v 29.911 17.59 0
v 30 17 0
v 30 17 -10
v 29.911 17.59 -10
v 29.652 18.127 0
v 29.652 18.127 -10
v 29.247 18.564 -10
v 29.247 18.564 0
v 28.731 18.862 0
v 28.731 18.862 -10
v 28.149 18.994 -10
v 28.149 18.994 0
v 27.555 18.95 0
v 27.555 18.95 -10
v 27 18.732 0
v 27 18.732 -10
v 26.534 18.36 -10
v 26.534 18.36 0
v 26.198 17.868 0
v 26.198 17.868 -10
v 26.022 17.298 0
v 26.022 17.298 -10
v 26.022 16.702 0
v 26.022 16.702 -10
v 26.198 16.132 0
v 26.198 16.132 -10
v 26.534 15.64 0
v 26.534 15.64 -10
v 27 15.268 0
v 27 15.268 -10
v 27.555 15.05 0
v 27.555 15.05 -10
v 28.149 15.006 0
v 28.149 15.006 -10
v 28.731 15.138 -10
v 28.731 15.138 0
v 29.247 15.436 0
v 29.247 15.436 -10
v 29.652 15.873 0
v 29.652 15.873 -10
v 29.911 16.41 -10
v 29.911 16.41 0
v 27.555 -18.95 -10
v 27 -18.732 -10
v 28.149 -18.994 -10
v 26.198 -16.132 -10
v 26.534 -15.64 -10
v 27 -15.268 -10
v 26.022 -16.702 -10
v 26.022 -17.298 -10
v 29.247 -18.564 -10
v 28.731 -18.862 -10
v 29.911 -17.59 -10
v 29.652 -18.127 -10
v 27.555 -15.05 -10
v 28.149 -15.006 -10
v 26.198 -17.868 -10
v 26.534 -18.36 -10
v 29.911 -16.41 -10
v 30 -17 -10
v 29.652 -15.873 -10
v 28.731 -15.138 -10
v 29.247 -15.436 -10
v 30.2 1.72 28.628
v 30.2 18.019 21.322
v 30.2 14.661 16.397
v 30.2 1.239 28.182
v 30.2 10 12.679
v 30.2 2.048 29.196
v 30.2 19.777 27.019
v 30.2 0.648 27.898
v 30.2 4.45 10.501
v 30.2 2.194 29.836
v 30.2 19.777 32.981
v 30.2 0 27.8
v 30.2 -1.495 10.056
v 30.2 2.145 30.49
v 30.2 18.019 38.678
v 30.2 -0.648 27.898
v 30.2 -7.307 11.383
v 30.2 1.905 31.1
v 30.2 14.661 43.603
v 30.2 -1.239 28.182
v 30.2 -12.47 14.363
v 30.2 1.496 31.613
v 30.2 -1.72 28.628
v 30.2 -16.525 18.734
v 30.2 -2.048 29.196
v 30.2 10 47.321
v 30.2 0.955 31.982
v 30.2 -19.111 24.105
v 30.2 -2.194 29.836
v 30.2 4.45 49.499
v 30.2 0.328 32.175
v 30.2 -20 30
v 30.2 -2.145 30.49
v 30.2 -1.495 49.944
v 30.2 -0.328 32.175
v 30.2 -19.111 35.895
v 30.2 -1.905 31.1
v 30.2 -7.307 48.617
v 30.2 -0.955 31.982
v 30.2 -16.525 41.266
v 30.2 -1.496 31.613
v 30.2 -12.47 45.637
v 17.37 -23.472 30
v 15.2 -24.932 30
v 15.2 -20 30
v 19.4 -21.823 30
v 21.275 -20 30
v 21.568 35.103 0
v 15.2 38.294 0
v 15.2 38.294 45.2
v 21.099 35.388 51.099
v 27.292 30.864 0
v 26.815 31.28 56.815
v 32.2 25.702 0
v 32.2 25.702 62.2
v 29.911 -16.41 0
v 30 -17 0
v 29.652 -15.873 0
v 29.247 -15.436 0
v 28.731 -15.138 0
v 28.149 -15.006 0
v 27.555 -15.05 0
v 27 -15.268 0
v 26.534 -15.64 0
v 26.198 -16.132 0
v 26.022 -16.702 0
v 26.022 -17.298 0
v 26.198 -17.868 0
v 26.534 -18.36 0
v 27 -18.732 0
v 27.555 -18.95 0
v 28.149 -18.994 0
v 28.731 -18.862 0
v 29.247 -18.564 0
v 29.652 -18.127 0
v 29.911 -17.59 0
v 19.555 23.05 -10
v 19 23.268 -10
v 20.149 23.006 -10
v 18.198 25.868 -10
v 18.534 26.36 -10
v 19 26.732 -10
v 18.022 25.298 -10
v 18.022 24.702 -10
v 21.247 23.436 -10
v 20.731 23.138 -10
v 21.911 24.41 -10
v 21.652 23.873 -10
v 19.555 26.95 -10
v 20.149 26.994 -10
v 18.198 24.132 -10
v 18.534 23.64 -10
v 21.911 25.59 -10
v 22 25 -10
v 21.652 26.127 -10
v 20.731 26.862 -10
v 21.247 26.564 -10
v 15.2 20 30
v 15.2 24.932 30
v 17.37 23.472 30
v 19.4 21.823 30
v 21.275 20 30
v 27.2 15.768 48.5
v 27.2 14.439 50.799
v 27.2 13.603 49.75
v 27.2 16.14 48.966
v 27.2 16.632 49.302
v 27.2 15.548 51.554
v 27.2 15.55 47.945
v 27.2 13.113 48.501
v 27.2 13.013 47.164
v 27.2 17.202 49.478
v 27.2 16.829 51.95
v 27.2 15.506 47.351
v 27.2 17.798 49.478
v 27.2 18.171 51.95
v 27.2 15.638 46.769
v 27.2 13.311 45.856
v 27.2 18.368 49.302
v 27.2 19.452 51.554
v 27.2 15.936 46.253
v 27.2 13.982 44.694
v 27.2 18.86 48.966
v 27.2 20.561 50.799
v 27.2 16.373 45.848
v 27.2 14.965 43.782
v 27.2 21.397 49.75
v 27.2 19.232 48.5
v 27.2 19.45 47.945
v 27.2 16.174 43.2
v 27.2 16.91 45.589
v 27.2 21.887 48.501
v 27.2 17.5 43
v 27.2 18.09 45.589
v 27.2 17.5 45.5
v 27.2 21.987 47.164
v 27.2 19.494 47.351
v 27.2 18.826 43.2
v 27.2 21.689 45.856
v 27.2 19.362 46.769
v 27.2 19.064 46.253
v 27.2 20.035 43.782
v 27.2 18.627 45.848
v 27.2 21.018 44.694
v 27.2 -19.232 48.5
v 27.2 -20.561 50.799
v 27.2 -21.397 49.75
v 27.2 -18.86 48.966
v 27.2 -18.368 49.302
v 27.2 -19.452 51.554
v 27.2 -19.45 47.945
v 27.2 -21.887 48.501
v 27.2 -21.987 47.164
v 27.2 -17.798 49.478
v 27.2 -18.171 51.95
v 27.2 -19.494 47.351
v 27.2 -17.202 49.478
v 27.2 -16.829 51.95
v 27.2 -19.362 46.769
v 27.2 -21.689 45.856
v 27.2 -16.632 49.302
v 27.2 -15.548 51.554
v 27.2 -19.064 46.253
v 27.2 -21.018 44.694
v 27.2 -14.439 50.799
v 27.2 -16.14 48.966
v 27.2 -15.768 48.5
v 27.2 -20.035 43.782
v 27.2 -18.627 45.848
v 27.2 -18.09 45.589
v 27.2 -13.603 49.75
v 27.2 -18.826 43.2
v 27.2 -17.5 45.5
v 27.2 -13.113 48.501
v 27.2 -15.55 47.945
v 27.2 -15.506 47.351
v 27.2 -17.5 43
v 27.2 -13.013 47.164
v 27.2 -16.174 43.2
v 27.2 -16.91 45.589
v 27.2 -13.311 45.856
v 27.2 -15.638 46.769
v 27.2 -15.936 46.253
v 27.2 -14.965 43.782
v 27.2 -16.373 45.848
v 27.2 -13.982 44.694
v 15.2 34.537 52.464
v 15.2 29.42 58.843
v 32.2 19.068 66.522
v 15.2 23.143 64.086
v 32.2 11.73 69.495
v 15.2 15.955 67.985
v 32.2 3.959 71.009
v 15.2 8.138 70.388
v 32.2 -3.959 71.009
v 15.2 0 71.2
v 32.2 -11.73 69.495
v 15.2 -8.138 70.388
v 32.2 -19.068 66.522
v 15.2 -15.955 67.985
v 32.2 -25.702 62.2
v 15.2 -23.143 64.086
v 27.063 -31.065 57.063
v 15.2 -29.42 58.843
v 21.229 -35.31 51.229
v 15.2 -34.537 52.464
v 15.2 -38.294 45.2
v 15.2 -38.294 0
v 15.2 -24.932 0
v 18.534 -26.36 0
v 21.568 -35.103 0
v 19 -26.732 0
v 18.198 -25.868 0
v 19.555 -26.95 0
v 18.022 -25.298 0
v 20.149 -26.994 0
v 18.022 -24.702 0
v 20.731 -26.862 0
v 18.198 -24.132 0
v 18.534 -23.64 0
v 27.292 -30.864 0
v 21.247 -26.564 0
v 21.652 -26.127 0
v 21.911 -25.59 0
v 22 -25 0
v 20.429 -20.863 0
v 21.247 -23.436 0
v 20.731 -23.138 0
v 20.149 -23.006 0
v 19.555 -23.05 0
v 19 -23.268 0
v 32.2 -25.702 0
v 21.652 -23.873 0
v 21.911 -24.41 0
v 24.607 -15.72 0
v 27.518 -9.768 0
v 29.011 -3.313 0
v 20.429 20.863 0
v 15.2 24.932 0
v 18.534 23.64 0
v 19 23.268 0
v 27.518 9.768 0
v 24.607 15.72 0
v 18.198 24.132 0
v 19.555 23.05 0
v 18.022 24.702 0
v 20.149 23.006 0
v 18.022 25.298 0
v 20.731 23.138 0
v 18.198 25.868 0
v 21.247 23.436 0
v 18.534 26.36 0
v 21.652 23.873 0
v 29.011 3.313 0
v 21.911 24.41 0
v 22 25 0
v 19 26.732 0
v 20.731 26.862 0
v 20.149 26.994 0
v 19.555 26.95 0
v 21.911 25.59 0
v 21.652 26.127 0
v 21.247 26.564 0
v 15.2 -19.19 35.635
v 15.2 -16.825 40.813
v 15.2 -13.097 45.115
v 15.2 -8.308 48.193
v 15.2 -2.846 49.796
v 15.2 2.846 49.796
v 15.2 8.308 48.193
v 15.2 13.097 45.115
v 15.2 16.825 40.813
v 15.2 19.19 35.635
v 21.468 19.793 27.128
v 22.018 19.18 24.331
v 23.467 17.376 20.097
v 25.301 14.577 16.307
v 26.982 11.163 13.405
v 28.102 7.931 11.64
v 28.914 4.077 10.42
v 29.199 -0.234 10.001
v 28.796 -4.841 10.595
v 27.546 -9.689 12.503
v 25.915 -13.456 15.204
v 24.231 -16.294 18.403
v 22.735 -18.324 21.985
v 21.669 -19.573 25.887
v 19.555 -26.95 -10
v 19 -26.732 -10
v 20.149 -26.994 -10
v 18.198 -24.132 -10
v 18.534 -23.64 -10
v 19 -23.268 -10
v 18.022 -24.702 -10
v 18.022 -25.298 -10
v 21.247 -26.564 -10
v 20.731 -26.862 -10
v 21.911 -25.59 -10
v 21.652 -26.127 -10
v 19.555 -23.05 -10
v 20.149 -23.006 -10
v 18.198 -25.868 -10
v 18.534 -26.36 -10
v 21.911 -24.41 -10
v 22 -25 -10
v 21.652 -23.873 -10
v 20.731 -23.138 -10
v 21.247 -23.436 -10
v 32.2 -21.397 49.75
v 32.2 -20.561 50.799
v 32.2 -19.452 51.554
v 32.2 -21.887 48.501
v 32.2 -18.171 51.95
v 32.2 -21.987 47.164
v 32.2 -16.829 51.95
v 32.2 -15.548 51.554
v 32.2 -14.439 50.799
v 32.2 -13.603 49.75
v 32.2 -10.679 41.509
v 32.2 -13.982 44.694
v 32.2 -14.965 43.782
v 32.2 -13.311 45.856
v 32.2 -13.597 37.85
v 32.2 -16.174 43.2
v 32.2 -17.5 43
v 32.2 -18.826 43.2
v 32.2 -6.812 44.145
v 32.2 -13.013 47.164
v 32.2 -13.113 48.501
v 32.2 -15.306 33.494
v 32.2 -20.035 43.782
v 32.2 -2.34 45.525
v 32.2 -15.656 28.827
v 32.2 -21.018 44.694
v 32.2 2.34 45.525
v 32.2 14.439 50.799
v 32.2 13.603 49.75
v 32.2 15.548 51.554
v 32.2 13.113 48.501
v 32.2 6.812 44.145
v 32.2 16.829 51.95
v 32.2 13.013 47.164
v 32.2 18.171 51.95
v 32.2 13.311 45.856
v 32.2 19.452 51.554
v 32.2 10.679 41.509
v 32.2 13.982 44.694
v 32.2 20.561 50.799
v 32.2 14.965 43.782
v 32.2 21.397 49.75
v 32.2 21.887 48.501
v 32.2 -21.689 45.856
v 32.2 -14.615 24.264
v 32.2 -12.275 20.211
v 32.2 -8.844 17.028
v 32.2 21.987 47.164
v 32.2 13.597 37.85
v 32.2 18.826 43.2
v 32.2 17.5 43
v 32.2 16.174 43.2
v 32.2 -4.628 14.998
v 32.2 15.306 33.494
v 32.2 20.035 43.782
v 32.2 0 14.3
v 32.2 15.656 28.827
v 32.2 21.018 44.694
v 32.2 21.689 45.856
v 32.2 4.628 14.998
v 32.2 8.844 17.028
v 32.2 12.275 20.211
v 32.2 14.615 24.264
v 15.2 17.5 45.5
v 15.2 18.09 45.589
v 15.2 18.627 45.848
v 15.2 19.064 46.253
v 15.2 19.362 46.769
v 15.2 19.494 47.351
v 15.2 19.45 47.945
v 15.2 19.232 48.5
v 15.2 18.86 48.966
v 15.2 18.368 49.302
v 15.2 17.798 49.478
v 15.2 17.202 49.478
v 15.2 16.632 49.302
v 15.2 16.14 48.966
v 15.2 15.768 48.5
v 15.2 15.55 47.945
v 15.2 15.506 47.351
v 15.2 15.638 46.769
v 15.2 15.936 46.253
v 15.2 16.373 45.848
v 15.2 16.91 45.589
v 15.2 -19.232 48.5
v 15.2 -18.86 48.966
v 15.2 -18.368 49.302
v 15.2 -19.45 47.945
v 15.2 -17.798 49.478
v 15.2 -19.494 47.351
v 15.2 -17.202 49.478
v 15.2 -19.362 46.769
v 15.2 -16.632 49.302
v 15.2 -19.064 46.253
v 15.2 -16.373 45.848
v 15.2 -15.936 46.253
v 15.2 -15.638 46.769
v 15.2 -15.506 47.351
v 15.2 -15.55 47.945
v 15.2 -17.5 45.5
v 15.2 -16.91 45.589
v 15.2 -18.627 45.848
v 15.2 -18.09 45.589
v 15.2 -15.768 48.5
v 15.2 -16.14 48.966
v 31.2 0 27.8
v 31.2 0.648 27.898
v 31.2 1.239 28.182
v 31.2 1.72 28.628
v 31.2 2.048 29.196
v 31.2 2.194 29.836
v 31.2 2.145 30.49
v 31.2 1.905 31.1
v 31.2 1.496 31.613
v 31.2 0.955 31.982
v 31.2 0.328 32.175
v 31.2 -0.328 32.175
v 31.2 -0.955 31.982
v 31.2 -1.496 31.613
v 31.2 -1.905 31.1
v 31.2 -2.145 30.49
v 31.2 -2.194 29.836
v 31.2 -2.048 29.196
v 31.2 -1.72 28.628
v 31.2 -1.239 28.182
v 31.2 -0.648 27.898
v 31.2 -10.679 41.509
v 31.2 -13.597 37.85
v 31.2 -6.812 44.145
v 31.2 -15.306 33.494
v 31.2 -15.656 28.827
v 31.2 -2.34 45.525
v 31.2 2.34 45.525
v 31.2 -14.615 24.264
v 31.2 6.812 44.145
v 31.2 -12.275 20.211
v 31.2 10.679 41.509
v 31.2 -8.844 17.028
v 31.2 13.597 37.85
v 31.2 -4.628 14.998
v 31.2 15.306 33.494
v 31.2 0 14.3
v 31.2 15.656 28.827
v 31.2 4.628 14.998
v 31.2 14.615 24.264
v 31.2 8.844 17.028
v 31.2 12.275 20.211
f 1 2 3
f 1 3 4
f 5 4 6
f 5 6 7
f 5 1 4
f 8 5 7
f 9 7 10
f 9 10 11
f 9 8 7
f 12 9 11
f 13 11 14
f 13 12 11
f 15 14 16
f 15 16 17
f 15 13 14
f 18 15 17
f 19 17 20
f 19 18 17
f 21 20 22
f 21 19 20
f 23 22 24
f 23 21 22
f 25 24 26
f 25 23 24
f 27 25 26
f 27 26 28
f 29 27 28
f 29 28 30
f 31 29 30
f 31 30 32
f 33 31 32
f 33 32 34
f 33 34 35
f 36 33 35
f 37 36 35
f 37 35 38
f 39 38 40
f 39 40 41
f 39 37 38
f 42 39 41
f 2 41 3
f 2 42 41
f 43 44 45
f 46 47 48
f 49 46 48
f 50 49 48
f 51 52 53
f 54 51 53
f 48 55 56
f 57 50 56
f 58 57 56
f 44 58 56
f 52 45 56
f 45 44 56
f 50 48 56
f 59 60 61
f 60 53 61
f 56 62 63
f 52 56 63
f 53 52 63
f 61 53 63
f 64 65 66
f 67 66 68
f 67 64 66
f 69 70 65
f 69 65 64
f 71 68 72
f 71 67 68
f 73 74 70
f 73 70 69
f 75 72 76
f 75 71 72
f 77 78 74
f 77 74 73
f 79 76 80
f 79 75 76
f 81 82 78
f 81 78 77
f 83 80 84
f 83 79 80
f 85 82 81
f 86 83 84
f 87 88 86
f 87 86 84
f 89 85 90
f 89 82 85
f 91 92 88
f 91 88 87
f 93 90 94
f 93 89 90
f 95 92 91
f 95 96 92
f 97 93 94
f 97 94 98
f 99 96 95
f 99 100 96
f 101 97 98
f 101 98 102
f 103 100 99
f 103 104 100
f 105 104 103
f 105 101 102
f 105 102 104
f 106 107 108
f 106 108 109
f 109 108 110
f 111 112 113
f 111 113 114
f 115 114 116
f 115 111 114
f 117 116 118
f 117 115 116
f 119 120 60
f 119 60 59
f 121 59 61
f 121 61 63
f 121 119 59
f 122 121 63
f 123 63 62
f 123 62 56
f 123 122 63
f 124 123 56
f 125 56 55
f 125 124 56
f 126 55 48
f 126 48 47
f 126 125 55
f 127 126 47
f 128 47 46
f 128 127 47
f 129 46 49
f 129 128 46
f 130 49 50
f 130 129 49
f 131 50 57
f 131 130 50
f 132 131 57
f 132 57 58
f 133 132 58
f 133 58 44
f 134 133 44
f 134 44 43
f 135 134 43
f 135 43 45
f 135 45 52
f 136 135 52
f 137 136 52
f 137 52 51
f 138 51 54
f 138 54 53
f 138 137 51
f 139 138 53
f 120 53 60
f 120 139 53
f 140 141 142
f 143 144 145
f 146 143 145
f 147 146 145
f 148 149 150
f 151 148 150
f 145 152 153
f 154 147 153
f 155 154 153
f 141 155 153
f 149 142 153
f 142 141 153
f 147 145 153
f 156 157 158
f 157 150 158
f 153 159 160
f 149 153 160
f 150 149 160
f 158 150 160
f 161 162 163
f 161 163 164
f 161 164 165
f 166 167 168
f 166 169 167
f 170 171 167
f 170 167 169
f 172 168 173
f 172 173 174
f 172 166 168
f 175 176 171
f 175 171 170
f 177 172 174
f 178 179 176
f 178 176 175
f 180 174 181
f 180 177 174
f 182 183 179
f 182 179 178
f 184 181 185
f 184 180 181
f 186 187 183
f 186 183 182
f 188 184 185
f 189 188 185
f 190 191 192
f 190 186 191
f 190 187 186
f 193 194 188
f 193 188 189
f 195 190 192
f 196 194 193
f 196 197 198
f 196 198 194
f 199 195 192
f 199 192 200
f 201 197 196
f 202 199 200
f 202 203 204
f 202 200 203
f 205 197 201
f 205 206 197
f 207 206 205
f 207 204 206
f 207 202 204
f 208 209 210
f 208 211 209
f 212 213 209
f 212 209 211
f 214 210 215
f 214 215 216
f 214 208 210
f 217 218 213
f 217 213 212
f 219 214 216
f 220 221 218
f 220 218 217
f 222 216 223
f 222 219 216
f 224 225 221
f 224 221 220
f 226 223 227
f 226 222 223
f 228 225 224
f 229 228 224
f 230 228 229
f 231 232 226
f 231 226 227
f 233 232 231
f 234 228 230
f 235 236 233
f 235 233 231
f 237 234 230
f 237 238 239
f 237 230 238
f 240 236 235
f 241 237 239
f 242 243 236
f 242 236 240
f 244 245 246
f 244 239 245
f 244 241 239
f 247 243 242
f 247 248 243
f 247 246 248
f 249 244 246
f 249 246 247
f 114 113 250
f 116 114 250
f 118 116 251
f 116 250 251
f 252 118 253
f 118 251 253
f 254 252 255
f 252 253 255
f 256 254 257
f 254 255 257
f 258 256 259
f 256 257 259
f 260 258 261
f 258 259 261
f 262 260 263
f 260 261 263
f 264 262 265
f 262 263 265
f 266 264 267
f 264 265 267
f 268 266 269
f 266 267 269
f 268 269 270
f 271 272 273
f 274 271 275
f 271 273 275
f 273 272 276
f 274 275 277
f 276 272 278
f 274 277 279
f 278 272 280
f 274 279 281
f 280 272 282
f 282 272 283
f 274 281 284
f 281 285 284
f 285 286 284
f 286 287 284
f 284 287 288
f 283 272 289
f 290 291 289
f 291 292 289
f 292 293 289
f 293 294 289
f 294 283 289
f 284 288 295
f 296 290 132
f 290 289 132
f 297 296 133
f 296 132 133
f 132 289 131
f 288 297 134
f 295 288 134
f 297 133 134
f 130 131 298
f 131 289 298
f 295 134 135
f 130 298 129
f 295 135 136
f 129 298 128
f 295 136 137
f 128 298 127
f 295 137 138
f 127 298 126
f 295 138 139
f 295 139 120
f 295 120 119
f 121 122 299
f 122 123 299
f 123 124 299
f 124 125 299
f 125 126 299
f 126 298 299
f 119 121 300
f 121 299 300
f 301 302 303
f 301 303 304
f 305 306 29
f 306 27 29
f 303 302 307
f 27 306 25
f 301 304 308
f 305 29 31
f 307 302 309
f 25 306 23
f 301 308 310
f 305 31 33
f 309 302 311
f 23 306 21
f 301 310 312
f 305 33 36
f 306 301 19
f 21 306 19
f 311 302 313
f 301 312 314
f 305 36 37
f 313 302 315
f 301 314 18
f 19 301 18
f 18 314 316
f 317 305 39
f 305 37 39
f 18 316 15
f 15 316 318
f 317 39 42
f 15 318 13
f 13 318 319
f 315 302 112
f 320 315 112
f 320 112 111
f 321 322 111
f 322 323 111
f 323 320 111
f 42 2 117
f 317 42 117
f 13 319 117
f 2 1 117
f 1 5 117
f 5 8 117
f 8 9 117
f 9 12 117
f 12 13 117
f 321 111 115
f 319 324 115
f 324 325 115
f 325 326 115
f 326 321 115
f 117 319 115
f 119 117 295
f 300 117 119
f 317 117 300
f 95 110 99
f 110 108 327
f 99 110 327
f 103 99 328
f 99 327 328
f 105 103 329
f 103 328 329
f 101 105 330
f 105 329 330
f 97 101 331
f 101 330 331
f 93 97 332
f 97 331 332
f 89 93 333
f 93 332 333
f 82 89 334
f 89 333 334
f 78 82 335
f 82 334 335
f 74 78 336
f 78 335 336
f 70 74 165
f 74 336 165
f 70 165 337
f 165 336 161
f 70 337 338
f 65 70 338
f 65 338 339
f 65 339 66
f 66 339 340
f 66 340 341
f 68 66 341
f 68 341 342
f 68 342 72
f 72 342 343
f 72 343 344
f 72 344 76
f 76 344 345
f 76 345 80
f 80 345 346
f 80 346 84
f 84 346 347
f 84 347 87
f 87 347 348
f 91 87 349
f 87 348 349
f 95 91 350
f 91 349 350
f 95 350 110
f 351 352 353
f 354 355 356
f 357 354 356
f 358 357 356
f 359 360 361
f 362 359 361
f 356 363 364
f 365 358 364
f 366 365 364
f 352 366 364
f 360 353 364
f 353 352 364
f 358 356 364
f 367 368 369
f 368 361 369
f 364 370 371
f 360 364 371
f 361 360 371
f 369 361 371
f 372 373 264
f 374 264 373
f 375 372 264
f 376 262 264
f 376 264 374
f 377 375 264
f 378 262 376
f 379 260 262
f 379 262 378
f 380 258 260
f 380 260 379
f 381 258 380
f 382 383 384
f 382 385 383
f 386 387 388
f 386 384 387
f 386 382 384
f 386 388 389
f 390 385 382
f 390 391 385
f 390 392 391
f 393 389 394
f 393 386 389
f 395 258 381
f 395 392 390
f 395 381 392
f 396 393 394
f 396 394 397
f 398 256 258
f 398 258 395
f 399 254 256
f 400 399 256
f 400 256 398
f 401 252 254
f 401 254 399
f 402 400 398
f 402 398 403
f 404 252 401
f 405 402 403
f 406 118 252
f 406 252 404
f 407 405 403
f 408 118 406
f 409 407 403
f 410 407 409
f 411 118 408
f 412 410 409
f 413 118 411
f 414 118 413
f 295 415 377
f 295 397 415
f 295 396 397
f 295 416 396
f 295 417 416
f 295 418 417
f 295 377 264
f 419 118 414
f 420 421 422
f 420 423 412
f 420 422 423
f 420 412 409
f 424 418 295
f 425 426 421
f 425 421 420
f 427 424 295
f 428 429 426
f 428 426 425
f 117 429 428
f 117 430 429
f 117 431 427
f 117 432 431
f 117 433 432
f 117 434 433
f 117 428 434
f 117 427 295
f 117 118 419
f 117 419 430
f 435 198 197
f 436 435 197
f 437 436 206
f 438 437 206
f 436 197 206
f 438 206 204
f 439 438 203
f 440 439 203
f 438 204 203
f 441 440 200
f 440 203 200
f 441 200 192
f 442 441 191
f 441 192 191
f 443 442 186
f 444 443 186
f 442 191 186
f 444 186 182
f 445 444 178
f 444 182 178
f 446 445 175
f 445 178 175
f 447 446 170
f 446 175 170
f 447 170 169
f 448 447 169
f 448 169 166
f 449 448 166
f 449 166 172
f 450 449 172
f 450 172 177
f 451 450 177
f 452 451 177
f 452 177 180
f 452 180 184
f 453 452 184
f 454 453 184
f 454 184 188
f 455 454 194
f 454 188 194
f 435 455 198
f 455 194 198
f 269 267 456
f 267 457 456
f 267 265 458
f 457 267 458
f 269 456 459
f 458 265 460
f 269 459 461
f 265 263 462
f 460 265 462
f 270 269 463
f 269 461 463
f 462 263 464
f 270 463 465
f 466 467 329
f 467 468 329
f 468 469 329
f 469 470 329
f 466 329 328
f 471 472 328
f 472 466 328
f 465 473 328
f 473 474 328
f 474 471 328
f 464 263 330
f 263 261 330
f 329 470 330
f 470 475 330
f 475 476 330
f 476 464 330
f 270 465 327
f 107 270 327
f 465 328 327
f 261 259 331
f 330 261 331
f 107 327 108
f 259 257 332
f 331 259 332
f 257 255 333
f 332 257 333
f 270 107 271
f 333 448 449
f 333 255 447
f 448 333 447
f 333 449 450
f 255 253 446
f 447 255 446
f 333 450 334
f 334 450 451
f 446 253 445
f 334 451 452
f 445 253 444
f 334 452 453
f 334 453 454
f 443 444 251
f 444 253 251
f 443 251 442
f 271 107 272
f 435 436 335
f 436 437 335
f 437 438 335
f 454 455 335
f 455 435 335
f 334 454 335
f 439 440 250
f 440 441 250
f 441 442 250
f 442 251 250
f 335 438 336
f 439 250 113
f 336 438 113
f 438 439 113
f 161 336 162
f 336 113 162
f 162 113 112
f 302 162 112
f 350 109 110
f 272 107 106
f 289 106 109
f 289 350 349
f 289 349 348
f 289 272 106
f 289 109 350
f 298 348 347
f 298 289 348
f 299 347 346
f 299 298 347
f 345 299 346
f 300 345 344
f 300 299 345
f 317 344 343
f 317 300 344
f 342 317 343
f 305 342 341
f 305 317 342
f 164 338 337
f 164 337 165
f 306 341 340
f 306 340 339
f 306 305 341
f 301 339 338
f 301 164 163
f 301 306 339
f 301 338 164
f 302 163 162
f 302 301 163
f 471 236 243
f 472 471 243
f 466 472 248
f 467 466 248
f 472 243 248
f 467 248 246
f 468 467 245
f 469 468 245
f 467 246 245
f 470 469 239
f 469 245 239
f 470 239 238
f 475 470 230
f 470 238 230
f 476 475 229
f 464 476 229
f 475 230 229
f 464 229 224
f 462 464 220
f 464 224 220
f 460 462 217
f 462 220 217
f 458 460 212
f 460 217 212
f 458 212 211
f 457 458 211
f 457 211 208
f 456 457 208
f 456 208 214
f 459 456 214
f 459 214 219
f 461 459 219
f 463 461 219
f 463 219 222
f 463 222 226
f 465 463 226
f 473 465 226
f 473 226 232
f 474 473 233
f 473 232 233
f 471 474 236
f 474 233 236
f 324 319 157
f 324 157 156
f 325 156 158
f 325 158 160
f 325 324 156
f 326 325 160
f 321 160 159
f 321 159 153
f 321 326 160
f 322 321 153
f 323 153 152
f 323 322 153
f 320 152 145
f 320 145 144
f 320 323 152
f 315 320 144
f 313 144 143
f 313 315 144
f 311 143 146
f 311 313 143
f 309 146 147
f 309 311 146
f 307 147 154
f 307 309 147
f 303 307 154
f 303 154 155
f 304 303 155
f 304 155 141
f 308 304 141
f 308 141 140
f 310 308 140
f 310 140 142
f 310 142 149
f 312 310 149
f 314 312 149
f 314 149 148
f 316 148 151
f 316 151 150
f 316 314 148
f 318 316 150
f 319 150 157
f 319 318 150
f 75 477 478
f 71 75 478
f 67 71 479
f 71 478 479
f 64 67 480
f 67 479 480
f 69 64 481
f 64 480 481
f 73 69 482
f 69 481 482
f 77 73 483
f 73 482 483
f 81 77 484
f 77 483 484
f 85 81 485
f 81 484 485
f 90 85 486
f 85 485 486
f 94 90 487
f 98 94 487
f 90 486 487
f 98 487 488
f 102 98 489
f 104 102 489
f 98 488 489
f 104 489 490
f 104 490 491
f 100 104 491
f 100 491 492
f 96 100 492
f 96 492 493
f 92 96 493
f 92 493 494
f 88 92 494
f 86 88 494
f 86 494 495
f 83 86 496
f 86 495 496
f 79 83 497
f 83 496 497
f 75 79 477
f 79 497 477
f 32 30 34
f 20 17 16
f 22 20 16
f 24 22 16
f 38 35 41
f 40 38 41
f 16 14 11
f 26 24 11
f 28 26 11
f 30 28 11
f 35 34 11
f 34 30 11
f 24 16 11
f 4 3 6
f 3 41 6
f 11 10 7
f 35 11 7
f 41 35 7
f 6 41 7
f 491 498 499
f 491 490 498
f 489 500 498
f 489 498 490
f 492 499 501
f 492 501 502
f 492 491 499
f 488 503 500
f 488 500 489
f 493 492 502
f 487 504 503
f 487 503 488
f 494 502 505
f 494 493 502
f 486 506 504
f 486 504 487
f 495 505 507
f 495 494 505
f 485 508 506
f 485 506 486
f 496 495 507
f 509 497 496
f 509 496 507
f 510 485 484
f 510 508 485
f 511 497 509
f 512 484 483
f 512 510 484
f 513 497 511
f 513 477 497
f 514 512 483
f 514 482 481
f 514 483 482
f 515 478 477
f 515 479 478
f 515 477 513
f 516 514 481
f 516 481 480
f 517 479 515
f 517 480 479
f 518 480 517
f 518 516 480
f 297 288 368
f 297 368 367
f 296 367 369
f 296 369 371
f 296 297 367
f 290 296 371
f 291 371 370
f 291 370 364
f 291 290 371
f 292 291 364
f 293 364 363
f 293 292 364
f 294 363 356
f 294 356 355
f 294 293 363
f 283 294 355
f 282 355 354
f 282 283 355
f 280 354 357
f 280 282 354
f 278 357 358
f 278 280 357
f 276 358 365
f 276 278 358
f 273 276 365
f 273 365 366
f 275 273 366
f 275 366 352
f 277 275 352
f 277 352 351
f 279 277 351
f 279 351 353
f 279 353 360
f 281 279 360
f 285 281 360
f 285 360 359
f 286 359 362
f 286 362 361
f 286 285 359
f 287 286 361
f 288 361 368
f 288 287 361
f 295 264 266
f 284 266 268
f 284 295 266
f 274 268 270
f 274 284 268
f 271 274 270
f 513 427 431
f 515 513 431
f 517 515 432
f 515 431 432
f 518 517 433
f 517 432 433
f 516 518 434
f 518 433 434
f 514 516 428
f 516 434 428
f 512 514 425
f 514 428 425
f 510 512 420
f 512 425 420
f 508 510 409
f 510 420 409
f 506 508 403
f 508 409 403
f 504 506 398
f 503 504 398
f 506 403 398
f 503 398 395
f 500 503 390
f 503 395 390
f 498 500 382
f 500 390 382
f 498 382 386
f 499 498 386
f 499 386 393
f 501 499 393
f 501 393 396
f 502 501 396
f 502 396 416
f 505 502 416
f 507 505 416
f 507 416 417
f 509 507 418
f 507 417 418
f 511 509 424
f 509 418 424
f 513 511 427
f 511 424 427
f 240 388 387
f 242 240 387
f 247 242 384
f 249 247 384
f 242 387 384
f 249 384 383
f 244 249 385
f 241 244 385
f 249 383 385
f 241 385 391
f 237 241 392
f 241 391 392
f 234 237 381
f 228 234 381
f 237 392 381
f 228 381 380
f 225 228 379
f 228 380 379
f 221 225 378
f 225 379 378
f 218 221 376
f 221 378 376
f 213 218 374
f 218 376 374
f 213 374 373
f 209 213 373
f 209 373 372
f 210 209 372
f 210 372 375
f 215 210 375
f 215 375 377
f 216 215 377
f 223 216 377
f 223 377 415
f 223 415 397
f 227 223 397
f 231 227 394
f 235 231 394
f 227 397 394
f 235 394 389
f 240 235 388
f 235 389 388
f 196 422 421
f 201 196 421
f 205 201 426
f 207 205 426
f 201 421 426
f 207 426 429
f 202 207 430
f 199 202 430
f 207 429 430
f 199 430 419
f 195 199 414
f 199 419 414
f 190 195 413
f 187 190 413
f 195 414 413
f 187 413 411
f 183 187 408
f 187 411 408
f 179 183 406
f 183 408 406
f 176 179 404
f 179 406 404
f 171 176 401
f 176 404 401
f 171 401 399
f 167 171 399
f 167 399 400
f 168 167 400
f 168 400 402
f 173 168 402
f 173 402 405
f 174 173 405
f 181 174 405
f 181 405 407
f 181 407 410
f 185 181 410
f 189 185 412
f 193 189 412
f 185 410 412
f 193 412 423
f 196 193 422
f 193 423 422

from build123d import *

# Parameters (mm, degrees)
SKETCH_1_W           = 17
SKETCH_1_H           = 82.4
EXTRUDE_1_DEPTH      = 30
EXTRUDE_2_DEPTH      = 17
CUT_EXTRUDE_1_DEPTH  = 62.2
SKETCH_4_R           = 2
EXTRUDE_3_DEPTH      = 10
SKETCH_5_R           = 20
CUT_EXTRUDE_2_DEPTH  = 15
SKETCH_6_R           = 15.7
CUT_EXTRUDE_3_DEPTH  = 1
SKETCH_7_R           = 2.2
CUT_EXTRUDE_4_DEPTH  = 1
SKETCH_8_R           = 29.2
CUT_EXTRUDE_7_DEPTH  = 30
SKETCH_9_R           = 4.5
CUT_EXTRUDE_9_DEPTH  = 5
SKETCH_10_R          = 2
CUT_EXTRUDE_10_DEPTH = 12


# Read off the part's stored shape, not the designer's step: 切除-拉伸1
with BuildPart() as part:
    # 草图1 → 凸台-拉伸1 (new body)
    with BuildSketch(Plane.XY):
        with Locations((23.7, 0)):
            Rectangle(SKETCH_1_W, SKETCH_1_H)
    extrude(amount=EXTRUDE_1_DEPTH)

    # 草图2 → 凸台-拉伸2 (add)
    with BuildSketch(Plane.ZY.offset(-15.2)):
        with BuildLine():
            Line((30, -41.2), (30, 41.2))
            ThreePointArc((30, 41.2), (71.2, 0), (30, -41.2))
        make_face()
    extrude(amount=-EXTRUDE_2_DEPTH)

    # 切除-拉伸1 outline → 切除-拉伸1 (cut)
    with BuildSketch(Plane.XY):
        with BuildLine():
            Line((32.2, -41.2), (32.2, -25.702139989))
            ThreePointArc((32.2, -25.702139989), (24.521954096, -33.107608904), (15.2, -38.293602599))
            Line((15.2, -38.293602599), (15.2, -41.2))
            Line((15.2, -41.2), (32.2, -41.2))
        make_face()
        with BuildLine():
            ThreePointArc((15.2, 38.293602599), (24.521954096, 33.107608904), (32.2, 25.702139989))
            Line((32.2, 25.702139989), (32.2, 41.2))
            Line((32.2, 41.2), (15.2, 41.2))
            Line((15.2, 41.2), (15.2, 38.293602599))
        make_face()
    extrude(amount=CUT_EXTRUDE_1_DEPTH, mode=Mode.SUBTRACT)

    # 草图4 → 凸台-拉伸3 (add)
    with BuildSketch(Plane.XY):
        with Locations((20, 25)):
            Circle(SKETCH_4_R)
        with Locations((28, 17)):
            Circle(SKETCH_4_R)
        with Locations((20, -25)):
            Circle(SKETCH_4_R)
        with Locations((28, -17)):
            Circle(SKETCH_4_R)
    extrude(amount=-EXTRUDE_3_DEPTH)

    # 草图5 → 切除-拉伸2 (cut)
    with BuildSketch(Plane.ZY.offset(-15.2)):
        with Locations(Location((30, 0, 0), (0, 0, 270))):
            Circle(SKETCH_5_R)
    extrude(amount=-CUT_EXTRUDE_2_DEPTH, mode=Mode.SUBTRACT)

    # 草图6 → 切除-拉伸3 (cut)
    with BuildSketch(Plane(origin=(32.2, 0, 0), x_dir=(0, 0, -1), z_dir=(1, 0, 0))):
        with Locations((-30, 0)):
            Circle(SKETCH_6_R)
    extrude(amount=-CUT_EXTRUDE_3_DEPTH, mode=Mode.SUBTRACT)

    # 草图7 → 切除-拉伸4 (cut)
    with BuildSketch(Plane(origin=(31.2, 0, 0), x_dir=(0, 0, -1), z_dir=(1, 0, 0))):
        with Locations((-30, 0)):
            Circle(SKETCH_7_R)
    extrude(amount=-CUT_EXTRUDE_4_DEPTH, mode=Mode.SUBTRACT)

    # 草图8 → 切除-拉伸7 (cut)
    with BuildSketch(Plane.XY):
        Circle(SKETCH_8_R)
    extrude(amount=CUT_EXTRUDE_7_DEPTH, mode=Mode.SUBTRACT)

    # 草图9 → 切除-拉伸9 (cut)
    with BuildSketch(Plane(origin=(32.2, 0, 0), x_dir=(0, 0, -1), z_dir=(1, 0, 0))):
        with Locations((-47.5, 17.5)):
            Circle(SKETCH_9_R)
        with Locations((-47.5, -17.5)):
            Circle(SKETCH_9_R)
    extrude(amount=-CUT_EXTRUDE_9_DEPTH, mode=Mode.SUBTRACT)

    # 草图10 → 切除-拉伸10 (cut)
    with BuildSketch(Plane(origin=(27.2, 0, 0), x_dir=(0, 0, -1), z_dir=(1, 0, 0))):
        with Locations((-47.5, 17.5)):
            Circle(SKETCH_10_R)
        with Locations((-47.5, -17.5)):
            Circle(SKETCH_10_R)
    extrude(amount=-CUT_EXTRUDE_10_DEPTH, mode=Mode.SUBTRACT)


solid = part.part
